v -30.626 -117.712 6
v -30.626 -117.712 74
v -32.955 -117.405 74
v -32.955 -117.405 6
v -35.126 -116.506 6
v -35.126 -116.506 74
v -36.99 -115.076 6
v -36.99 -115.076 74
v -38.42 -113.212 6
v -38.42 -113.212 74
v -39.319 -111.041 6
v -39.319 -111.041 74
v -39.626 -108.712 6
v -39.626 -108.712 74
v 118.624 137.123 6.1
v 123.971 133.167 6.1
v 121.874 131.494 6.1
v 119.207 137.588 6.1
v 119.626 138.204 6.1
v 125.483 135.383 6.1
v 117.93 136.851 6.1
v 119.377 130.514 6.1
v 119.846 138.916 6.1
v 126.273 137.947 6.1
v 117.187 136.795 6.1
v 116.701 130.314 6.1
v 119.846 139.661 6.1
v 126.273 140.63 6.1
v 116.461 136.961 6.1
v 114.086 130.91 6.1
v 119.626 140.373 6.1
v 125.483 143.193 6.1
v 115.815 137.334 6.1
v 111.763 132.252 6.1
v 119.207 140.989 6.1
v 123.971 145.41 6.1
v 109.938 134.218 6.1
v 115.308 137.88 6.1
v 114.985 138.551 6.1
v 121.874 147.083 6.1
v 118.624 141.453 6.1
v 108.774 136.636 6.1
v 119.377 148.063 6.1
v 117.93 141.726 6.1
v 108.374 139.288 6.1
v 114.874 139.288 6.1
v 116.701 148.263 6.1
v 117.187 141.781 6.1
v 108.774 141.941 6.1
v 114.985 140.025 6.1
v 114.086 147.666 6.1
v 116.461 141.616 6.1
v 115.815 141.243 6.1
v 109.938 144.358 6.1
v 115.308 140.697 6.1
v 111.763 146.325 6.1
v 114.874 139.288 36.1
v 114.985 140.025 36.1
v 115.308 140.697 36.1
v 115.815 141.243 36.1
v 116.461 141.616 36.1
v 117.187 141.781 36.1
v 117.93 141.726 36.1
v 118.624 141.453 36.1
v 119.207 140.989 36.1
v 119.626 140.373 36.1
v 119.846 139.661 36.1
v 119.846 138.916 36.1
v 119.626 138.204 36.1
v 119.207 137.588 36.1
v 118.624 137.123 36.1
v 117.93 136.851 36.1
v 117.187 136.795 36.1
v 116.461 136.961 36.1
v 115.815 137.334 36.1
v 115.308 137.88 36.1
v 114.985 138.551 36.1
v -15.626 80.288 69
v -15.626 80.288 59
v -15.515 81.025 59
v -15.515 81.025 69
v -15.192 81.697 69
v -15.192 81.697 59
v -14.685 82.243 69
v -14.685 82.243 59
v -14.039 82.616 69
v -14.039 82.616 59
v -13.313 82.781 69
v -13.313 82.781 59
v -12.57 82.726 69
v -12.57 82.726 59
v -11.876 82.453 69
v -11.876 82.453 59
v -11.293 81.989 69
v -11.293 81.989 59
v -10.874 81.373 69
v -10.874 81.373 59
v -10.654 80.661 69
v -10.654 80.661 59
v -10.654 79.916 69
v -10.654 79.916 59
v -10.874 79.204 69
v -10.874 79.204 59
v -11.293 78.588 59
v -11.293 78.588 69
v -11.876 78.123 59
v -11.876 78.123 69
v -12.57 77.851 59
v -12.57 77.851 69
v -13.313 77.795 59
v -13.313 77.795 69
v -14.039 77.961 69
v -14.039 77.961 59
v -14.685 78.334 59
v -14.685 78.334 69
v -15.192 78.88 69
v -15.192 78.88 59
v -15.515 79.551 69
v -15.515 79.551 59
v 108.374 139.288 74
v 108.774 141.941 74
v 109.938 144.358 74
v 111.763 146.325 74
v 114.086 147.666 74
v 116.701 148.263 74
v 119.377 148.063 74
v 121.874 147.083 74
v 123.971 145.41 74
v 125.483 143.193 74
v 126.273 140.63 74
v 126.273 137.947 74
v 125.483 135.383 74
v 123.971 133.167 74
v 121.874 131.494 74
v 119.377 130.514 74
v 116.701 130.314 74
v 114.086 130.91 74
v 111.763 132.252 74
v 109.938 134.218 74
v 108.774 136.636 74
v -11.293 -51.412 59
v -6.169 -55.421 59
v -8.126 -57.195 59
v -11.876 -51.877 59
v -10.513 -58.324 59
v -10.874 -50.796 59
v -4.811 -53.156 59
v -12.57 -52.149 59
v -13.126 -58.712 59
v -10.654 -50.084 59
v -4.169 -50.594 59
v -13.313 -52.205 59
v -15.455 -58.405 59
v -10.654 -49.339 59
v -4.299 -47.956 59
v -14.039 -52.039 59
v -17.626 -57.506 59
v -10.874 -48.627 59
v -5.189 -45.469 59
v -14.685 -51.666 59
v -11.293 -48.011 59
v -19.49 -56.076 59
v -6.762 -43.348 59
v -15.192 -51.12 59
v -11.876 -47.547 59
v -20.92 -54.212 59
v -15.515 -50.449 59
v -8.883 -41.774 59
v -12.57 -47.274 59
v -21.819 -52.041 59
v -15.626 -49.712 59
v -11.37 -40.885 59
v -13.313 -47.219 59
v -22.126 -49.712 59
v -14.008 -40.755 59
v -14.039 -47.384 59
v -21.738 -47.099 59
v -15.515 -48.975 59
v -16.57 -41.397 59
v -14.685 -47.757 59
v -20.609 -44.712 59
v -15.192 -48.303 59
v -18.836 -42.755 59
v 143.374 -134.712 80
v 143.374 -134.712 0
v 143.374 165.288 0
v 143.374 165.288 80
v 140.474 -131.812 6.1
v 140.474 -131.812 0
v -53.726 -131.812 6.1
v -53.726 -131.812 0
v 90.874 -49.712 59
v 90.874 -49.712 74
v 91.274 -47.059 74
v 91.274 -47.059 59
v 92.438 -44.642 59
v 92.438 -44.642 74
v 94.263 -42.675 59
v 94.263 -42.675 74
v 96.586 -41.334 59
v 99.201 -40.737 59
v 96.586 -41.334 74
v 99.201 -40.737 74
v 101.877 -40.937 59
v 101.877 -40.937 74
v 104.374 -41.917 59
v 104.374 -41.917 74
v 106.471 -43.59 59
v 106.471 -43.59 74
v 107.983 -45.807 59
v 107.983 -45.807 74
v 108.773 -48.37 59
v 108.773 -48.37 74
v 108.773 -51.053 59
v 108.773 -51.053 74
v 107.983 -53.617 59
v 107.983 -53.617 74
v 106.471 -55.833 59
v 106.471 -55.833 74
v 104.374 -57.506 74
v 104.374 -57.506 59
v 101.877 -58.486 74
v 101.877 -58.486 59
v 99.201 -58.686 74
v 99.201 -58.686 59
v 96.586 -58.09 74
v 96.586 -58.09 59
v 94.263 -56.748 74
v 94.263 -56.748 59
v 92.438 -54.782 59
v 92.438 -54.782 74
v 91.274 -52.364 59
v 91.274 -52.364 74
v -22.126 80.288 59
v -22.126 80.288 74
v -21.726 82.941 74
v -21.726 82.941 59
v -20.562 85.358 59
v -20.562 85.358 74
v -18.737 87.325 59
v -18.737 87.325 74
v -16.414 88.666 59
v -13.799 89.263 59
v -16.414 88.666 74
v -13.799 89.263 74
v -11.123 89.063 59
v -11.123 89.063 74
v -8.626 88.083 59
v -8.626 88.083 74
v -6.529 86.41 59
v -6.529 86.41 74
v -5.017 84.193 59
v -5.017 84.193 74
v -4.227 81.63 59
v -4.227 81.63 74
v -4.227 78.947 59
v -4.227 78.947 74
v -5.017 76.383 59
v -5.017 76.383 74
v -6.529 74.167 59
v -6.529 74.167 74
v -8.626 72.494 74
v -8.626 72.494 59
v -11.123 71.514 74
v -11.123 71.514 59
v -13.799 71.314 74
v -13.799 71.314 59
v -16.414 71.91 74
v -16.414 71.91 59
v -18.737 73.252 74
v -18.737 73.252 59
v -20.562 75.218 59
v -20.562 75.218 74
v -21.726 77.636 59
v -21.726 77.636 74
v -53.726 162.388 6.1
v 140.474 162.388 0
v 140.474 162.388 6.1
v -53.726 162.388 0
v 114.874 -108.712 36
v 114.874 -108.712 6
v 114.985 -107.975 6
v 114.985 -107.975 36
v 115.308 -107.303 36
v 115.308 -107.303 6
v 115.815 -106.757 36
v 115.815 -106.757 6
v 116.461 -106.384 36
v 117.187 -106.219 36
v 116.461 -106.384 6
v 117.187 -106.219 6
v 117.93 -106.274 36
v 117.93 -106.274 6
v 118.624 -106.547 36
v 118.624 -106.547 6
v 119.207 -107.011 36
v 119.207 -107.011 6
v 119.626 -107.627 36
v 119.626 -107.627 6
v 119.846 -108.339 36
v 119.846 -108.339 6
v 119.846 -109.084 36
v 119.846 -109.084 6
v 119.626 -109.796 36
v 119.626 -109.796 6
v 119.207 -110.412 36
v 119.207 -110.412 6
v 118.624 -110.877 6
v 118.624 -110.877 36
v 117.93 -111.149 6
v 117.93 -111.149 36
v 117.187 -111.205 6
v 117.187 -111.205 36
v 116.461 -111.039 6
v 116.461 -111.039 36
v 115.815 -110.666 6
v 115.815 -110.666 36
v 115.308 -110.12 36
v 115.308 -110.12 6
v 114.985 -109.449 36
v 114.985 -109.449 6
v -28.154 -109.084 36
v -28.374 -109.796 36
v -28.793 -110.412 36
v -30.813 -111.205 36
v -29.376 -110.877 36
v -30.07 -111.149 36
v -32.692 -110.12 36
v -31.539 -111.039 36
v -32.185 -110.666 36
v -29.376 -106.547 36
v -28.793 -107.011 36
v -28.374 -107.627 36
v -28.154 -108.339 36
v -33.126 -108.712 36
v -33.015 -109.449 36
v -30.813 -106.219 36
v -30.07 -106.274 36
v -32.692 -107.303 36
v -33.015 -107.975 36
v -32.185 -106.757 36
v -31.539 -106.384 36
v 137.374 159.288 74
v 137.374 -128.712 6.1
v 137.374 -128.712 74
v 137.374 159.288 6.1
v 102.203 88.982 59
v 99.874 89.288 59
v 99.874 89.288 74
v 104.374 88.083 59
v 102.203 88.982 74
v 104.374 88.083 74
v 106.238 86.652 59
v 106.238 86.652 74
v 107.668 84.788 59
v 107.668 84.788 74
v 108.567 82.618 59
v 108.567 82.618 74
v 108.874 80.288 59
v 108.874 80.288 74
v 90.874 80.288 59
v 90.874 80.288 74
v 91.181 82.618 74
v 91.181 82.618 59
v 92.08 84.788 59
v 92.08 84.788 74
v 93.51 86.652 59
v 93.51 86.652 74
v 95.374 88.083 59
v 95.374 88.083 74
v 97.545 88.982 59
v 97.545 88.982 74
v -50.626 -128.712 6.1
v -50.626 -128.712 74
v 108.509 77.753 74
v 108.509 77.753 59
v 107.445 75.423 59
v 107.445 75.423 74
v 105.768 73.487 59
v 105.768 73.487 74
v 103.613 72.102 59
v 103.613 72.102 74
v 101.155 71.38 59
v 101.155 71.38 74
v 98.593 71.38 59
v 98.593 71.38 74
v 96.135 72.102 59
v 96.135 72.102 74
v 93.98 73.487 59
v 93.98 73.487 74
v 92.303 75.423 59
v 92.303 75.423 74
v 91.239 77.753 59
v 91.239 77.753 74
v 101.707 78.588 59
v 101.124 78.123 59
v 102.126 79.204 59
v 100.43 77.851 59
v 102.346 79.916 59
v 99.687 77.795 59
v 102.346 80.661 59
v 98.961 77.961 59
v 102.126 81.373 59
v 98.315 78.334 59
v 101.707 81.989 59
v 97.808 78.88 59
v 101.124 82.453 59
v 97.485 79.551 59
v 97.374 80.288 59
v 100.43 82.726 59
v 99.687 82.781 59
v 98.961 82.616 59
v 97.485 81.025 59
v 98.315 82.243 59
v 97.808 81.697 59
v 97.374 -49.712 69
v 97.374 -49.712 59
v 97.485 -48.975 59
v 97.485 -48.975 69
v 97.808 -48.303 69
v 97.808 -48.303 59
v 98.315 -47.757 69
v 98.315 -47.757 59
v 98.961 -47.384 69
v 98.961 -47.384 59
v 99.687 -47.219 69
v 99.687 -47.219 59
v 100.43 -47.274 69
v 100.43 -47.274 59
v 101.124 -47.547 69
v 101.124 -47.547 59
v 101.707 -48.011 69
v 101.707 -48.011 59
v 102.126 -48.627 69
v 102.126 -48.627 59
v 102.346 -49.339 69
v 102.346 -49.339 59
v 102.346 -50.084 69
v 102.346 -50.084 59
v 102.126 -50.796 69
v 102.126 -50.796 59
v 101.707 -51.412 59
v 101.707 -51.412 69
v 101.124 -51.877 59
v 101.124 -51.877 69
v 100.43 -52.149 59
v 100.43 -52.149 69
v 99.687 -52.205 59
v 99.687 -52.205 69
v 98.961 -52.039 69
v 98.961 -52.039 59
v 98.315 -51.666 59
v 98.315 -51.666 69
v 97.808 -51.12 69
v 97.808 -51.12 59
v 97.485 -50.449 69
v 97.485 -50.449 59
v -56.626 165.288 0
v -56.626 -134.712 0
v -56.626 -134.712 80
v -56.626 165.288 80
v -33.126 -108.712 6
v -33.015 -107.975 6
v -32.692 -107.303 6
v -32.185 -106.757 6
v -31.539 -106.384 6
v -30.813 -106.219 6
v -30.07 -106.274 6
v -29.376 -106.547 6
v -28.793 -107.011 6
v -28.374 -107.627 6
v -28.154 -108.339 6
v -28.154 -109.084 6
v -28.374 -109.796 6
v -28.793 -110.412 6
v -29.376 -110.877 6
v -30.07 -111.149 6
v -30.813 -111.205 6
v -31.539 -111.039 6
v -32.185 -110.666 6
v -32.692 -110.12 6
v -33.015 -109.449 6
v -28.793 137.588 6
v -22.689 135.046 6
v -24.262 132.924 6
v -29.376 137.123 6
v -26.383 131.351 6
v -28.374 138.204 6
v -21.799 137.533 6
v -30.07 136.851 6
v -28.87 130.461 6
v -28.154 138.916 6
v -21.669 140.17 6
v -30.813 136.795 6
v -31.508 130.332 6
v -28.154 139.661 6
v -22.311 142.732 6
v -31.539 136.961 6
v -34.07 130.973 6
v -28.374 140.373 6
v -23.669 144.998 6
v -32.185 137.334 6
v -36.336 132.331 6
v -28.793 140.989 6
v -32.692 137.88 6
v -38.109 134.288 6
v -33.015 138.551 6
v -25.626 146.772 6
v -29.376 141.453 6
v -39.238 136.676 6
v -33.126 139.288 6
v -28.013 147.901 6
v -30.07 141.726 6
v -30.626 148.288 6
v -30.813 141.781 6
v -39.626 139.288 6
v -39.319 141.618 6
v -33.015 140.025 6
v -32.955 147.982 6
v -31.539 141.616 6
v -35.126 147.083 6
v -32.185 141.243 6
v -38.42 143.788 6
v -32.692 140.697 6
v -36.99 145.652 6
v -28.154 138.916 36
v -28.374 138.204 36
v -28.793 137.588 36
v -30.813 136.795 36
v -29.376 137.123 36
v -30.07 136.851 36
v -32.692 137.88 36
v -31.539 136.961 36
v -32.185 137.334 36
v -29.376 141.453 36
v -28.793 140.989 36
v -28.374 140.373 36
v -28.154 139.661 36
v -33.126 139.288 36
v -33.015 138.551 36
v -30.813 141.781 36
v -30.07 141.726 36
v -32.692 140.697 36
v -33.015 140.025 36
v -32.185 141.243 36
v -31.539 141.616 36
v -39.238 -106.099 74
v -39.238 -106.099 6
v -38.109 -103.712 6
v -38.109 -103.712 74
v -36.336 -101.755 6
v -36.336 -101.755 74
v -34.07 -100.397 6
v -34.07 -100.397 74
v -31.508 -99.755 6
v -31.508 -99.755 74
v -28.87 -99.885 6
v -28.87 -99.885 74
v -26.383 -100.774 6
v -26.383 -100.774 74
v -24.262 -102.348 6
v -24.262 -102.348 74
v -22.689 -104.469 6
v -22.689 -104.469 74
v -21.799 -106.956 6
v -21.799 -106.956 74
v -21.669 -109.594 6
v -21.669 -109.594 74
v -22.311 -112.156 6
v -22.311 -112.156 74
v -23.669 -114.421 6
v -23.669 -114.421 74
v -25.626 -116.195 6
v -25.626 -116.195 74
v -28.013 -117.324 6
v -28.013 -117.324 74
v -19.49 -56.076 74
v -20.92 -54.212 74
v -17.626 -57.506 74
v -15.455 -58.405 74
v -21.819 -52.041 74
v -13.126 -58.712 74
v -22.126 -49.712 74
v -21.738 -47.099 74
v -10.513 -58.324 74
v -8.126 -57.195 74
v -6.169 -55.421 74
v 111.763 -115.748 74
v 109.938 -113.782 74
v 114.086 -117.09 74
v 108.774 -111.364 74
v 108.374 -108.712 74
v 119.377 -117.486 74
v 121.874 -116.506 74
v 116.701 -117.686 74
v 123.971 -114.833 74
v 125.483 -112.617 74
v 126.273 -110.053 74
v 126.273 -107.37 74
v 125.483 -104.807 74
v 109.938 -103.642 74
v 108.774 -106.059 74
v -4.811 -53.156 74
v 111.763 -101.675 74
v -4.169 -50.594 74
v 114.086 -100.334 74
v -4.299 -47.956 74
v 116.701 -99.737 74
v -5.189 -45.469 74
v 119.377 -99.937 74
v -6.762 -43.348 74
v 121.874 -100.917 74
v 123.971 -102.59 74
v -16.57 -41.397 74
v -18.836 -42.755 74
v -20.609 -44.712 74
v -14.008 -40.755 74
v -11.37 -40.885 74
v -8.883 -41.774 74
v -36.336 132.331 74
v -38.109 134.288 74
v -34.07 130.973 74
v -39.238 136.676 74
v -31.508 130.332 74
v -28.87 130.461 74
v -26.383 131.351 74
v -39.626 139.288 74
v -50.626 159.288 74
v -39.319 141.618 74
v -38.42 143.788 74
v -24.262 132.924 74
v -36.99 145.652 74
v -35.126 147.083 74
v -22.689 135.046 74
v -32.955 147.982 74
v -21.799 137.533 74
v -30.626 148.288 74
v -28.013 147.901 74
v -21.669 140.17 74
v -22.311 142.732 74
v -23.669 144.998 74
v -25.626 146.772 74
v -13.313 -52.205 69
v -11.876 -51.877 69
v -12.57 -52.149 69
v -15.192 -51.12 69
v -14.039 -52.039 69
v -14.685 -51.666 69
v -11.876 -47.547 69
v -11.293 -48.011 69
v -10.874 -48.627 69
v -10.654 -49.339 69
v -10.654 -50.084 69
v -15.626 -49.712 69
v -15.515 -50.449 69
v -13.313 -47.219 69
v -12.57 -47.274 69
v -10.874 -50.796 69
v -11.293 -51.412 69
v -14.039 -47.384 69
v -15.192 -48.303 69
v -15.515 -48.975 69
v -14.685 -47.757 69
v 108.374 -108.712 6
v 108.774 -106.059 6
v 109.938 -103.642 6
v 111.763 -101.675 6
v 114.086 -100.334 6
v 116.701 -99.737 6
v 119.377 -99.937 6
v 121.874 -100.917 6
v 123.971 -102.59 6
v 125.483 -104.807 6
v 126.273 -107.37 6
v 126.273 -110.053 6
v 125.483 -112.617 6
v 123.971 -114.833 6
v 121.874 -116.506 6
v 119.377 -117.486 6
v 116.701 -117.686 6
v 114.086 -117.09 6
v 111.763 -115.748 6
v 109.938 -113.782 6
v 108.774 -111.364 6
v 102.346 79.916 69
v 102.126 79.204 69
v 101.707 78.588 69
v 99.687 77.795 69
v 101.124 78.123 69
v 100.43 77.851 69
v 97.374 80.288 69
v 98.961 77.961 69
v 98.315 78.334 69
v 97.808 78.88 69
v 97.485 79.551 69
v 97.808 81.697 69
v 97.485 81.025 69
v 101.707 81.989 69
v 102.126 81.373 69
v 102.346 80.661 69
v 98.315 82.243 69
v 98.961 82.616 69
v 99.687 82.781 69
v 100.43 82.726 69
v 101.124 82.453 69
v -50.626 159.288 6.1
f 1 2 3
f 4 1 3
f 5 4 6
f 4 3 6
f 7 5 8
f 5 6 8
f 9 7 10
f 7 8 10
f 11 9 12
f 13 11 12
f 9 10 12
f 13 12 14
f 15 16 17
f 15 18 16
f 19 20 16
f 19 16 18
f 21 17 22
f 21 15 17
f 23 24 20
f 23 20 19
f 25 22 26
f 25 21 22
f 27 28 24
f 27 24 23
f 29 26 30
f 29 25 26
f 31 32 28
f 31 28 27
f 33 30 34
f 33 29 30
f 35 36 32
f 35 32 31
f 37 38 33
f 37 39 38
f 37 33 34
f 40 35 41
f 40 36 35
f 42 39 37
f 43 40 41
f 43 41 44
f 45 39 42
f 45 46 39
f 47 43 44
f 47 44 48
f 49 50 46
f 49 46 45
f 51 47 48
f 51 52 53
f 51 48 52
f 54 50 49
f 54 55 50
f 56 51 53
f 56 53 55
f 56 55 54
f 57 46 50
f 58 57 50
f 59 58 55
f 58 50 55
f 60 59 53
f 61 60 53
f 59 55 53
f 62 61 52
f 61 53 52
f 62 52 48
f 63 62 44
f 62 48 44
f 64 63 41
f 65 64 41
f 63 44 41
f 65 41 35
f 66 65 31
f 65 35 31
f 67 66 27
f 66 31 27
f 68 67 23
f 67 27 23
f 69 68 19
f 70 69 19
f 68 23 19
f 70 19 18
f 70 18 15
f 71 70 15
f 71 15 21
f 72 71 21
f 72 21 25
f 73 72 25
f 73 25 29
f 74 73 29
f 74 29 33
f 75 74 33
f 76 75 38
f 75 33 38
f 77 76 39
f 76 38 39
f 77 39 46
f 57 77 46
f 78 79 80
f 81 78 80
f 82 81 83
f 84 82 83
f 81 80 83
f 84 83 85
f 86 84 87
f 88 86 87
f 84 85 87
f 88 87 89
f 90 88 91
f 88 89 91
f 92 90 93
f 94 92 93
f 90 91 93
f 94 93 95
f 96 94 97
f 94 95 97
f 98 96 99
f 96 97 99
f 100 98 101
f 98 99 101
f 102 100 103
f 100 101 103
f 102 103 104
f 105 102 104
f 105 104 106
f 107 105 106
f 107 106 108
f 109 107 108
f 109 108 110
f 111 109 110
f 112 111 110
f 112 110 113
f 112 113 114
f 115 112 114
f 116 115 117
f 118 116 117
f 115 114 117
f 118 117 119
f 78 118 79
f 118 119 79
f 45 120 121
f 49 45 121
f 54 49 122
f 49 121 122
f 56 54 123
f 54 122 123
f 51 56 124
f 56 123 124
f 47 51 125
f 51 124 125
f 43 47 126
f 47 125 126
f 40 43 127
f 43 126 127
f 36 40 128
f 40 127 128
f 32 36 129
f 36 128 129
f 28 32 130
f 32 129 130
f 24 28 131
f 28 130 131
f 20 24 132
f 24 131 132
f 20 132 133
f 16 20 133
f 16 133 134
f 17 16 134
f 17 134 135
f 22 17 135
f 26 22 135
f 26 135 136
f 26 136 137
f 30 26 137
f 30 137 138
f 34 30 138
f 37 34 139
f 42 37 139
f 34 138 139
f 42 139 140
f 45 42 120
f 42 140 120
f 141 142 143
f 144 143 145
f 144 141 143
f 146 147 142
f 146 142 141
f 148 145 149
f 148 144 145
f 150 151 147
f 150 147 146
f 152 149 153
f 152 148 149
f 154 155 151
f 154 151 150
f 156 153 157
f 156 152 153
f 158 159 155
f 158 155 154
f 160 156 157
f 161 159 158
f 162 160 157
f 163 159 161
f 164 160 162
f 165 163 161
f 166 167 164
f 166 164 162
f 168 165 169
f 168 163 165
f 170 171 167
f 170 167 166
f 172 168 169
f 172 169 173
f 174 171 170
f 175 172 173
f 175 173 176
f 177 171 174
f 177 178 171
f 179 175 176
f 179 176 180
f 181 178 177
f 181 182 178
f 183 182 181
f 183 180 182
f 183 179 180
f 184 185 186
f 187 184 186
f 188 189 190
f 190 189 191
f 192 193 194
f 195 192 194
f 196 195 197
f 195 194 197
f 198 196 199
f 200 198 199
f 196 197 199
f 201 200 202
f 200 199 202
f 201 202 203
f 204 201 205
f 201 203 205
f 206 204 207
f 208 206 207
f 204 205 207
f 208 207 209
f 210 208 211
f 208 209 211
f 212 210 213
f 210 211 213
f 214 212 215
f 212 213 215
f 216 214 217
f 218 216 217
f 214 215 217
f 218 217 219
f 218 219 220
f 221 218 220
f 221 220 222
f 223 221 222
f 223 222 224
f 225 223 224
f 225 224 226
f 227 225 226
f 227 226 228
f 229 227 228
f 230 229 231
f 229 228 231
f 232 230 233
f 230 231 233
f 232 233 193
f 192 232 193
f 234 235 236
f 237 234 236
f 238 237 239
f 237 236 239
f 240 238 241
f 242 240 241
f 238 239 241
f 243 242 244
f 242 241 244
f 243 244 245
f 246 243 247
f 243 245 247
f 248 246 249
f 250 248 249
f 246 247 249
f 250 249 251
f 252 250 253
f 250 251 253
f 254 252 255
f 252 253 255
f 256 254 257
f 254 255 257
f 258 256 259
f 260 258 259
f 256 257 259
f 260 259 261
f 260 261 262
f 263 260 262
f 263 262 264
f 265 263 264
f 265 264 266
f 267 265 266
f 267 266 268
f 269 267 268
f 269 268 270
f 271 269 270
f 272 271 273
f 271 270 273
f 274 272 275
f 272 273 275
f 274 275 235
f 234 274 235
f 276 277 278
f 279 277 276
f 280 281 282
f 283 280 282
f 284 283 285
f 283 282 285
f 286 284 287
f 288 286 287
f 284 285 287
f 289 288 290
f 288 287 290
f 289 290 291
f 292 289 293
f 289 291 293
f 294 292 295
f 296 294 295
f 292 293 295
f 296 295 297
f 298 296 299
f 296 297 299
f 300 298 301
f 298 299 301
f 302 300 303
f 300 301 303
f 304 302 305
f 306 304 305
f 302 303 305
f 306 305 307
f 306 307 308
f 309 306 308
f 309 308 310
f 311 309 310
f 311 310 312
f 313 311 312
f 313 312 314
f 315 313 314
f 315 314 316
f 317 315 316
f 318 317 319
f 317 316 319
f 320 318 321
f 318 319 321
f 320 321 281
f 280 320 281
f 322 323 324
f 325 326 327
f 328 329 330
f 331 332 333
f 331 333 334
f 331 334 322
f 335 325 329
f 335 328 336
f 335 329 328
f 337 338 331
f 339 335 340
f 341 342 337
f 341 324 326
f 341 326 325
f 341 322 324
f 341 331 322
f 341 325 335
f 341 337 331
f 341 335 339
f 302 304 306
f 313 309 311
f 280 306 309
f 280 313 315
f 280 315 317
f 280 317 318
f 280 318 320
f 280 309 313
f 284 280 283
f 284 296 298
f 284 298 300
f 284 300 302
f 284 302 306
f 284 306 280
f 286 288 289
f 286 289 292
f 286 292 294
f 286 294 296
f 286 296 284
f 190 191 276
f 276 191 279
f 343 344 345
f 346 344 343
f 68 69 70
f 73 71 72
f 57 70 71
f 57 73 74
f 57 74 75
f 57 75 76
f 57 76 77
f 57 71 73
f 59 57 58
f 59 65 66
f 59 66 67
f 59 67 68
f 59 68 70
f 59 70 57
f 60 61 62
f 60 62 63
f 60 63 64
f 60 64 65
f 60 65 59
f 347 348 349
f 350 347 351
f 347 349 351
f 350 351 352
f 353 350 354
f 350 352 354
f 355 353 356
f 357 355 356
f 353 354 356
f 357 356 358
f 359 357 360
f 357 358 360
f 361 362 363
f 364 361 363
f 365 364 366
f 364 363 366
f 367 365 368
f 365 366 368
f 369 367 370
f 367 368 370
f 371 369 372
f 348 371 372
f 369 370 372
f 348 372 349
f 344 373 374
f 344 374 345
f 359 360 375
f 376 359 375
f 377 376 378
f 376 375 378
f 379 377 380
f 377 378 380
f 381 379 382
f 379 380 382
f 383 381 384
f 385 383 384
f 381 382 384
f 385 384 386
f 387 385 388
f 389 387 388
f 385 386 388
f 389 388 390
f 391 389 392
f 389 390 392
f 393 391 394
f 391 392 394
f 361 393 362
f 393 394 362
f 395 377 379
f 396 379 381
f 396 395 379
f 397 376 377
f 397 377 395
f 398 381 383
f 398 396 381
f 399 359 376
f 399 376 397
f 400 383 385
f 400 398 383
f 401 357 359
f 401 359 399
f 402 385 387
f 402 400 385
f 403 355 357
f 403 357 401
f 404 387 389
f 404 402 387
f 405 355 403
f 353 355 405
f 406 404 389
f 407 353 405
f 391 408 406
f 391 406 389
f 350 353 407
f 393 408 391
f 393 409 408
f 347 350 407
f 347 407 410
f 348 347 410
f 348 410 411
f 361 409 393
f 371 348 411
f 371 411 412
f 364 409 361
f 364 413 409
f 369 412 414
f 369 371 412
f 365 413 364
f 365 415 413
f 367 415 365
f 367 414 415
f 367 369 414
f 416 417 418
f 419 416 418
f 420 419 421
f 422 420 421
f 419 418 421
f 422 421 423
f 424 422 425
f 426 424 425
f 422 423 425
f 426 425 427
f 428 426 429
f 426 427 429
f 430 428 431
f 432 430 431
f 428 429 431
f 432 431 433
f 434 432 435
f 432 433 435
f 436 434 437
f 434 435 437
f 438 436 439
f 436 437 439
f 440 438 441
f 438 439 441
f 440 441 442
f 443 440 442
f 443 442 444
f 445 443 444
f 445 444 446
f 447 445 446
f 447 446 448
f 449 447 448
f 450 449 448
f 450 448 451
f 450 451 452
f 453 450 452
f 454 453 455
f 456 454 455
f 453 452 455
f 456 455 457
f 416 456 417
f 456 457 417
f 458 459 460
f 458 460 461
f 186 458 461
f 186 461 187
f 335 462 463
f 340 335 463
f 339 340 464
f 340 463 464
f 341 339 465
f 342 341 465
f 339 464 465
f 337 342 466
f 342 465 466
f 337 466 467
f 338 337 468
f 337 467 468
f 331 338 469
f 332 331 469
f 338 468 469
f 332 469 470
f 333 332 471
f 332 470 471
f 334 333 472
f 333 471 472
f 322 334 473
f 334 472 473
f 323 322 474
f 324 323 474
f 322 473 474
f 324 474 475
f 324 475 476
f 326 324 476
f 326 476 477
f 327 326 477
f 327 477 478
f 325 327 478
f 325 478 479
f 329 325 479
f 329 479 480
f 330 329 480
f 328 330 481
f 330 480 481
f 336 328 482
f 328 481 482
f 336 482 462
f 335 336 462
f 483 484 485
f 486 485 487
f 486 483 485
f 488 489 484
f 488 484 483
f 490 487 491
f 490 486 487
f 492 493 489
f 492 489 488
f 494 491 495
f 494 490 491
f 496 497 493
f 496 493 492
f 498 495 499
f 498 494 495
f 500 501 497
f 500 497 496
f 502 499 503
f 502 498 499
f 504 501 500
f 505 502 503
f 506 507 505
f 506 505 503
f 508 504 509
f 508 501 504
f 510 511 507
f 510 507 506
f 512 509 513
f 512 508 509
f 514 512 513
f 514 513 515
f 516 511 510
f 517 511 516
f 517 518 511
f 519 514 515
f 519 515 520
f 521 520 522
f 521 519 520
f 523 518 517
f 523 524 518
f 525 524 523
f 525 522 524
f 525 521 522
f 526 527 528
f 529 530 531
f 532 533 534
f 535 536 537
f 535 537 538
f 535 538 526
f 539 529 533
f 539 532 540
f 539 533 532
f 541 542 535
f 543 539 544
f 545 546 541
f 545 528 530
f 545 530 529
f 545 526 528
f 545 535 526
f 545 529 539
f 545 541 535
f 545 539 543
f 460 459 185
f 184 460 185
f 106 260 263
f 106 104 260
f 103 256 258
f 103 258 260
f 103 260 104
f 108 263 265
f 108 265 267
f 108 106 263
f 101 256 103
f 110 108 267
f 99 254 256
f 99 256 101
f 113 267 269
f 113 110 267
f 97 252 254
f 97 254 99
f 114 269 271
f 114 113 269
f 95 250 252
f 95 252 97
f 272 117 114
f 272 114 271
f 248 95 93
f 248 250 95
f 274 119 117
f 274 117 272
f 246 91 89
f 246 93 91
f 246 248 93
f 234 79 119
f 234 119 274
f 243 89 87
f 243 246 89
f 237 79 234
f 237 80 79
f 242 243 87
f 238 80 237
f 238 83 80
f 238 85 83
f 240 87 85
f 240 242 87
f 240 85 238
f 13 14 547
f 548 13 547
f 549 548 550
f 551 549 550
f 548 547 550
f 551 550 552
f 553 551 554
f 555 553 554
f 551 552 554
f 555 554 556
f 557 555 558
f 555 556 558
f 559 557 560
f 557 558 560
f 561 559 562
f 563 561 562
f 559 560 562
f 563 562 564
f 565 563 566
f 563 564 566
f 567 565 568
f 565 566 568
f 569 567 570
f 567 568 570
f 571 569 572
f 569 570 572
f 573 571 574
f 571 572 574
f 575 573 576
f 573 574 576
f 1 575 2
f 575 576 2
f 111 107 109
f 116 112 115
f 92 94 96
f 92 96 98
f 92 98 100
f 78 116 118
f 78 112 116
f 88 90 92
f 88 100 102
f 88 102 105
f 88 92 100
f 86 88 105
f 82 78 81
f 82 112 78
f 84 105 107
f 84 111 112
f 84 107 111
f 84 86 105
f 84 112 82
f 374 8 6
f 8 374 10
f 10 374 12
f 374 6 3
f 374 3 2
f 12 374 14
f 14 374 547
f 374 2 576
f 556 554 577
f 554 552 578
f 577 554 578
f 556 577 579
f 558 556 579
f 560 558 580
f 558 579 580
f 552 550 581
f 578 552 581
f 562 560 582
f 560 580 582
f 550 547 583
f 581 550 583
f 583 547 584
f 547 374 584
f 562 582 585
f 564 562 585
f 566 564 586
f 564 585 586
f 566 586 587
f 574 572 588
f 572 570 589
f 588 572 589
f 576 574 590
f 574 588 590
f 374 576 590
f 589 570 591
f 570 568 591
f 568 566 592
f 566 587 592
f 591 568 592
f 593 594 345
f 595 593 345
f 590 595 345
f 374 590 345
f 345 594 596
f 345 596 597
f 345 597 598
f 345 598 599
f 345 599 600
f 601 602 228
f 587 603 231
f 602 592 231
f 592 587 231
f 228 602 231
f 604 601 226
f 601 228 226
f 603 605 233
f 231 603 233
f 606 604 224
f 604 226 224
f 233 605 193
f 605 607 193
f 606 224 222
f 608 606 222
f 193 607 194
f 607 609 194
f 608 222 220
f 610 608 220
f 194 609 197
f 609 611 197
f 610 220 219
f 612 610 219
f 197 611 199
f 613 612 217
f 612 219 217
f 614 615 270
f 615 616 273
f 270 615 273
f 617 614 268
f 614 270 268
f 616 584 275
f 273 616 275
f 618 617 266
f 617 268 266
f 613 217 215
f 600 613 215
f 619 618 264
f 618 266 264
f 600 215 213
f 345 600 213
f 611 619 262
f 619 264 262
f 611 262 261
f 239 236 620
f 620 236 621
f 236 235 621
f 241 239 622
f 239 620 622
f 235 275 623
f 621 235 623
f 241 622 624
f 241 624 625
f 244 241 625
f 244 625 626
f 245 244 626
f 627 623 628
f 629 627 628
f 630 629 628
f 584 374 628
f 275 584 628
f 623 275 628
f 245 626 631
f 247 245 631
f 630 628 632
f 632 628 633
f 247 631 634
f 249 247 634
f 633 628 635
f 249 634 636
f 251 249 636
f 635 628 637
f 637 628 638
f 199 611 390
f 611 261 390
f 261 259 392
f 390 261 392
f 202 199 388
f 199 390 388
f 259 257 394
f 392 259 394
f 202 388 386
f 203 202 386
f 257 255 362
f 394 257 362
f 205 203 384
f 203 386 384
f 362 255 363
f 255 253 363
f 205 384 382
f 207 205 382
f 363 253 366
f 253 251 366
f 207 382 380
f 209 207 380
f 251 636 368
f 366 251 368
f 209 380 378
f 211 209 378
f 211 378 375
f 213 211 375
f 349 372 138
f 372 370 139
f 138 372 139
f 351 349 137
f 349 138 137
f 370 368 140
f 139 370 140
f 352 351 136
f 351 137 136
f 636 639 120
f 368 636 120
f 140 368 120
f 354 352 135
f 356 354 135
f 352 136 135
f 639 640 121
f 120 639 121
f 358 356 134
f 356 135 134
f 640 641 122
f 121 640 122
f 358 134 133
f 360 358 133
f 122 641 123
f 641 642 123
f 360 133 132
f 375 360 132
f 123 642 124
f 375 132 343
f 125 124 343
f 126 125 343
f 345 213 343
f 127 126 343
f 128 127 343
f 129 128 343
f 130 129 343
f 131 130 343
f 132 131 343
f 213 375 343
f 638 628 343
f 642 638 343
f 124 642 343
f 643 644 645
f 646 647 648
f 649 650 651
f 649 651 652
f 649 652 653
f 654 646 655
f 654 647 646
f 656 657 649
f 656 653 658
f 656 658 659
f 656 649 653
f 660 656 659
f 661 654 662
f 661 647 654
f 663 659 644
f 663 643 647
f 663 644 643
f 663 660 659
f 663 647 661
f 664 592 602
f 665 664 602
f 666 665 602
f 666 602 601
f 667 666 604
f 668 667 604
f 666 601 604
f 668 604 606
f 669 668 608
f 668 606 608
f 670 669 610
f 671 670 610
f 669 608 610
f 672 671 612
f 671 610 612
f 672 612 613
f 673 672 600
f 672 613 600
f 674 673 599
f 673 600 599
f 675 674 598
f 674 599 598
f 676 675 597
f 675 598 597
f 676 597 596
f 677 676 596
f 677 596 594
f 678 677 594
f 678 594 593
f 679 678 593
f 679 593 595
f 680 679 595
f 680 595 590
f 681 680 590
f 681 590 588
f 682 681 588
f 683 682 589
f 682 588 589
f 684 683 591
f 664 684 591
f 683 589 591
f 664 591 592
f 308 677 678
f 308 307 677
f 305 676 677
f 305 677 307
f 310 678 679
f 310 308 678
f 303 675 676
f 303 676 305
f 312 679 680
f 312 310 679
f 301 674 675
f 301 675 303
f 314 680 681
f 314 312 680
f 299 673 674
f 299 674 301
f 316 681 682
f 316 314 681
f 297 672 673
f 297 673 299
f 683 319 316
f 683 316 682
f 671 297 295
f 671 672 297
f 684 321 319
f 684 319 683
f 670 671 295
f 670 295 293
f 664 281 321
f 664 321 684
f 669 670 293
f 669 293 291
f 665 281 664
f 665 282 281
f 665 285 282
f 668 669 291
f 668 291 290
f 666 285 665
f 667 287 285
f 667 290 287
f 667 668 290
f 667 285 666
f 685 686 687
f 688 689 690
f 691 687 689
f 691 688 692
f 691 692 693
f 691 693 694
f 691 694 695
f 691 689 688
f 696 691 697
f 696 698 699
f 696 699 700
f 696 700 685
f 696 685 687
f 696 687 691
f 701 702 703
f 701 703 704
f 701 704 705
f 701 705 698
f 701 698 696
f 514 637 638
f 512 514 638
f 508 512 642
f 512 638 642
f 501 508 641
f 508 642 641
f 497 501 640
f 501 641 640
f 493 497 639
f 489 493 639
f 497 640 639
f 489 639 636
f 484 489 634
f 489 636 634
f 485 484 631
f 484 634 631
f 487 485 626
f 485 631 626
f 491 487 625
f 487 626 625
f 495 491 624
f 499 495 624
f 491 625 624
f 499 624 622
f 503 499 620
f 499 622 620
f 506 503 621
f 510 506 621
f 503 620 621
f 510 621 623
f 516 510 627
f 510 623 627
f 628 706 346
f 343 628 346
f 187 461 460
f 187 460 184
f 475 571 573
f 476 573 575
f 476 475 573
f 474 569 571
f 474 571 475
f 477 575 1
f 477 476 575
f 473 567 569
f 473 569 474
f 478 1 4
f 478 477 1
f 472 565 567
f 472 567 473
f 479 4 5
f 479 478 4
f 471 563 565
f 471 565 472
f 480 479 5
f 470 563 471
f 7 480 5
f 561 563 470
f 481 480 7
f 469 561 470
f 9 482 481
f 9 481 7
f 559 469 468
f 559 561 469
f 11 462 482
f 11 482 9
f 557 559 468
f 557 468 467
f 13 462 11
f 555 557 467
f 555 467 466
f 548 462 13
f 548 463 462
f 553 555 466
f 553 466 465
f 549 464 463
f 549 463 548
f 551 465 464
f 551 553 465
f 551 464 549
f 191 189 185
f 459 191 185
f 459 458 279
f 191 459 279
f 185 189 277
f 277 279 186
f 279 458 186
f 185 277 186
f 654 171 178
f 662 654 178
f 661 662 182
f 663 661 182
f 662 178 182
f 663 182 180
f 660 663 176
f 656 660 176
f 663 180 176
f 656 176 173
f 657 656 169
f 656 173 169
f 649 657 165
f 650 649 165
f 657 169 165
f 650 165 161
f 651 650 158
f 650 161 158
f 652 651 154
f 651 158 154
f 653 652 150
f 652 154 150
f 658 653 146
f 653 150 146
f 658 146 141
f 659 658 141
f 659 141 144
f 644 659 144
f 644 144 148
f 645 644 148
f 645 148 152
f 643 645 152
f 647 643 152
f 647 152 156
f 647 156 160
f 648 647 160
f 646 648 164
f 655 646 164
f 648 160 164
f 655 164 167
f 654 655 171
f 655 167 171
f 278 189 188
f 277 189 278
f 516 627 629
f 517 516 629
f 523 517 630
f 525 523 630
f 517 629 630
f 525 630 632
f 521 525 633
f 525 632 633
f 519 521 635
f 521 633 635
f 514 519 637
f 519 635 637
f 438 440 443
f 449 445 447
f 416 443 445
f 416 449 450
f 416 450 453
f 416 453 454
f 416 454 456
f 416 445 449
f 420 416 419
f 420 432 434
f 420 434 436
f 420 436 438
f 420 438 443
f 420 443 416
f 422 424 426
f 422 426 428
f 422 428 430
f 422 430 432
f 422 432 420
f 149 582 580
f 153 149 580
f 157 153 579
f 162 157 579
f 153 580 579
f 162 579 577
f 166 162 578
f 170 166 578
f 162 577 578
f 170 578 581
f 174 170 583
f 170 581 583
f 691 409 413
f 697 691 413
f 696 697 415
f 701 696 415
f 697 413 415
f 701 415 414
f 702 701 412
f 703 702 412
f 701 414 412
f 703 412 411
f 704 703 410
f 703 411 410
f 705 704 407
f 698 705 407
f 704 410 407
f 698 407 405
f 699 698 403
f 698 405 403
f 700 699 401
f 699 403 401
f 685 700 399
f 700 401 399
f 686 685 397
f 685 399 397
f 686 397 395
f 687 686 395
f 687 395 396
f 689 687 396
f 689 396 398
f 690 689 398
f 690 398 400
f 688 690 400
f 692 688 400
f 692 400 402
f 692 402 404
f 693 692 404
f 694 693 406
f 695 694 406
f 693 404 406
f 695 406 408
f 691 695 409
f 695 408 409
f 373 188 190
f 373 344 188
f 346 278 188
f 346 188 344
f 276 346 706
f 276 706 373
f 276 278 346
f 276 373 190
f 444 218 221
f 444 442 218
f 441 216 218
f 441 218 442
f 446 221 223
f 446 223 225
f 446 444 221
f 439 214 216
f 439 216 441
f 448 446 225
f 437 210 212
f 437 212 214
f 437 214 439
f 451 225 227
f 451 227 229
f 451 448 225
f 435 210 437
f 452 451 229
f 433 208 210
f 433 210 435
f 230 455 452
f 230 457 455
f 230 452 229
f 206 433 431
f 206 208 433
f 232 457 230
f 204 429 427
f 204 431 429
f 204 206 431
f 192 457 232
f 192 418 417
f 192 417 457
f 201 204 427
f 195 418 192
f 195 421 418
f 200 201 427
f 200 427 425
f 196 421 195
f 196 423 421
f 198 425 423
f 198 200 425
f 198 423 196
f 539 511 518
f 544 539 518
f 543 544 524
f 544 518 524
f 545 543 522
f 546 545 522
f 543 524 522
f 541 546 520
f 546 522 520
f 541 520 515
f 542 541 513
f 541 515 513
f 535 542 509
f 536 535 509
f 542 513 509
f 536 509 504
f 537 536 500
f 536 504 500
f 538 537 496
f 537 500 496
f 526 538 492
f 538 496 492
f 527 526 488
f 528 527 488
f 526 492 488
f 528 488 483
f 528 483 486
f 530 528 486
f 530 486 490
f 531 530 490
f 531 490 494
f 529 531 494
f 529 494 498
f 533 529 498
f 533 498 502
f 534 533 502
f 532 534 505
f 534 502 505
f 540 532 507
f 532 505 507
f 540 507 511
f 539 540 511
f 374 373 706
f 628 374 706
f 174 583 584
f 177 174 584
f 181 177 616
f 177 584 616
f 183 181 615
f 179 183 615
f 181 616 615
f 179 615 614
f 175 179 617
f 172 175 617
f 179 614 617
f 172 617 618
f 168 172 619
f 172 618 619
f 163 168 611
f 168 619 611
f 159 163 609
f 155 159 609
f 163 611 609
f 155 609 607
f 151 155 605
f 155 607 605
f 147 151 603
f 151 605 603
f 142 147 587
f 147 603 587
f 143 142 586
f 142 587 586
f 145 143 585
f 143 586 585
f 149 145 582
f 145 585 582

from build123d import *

# Parameters (mm, degrees)
ESQUISSE1_W             = 200
ESQUISSE1_H             = 300
BOSS_EXTRU_1_DEPTH      = 80
COQUE1_T                = -6
ESQUISSE3_W             = 194.2
ESQUISSE3_H             = 294.2
ENL_V_MAT_EXTRU_2_DEPTH = 6.1
ESQUISSE4_R             = 9
BOSS_EXTRU_2_DEPTH      = 67.9
ESQUISSE5_R             = 2.5
ENL_V_MAT_EXTRU_3_DEPTH = 30
ESQUISSE4_4_R           = 9
BOSS_EXTRU_3_DEPTH      = 15
ESQUISSE6_R             = 2.5
ENL_V_MAT_EXTRU_6_DEPTH = 10
ESQUISSE8_R             = 9
BOSS_EXTRU_5_DEPTH      = 68
ESQUISSE9_R             = 2.5
ENL_V_MAT_EXTRU_8_DEPTH = 30


with BuildPart() as part:
    # Esquisse1 → Boss.-Extru.1 (new body)
    with BuildSketch(Plane.XY):
        with Locations((43.373964051, -118.711656442)):
            Rectangle(ESQUISSE1_W, ESQUISSE1_H)
    extrude(amount=BOSS_EXTRU_1_DEPTH)

    # Coque1
    coque1_openings = [part.faces().sort_by_distance(p)[0] for p in [
        (43.373964051, -118.711656442, 0),
    ]]
    offset(amount=COQUE1_T, openings=coque1_openings, kind=Kind.INTERSECTION)

    # Esquisse3 → Enlèv. mat.-Extru.2 (cut)
    with BuildSketch(Plane(origin=(0, 0, 0), x_dir=(-1, 0, 0), z_dir=(0, 0, -1))):
        with Locations((-43.373964051, -118.711656442)):
            Rectangle(ESQUISSE3_W, ESQUISSE3_H)
    extrude(amount=-ENL_V_MAT_EXTRU_2_DEPTH, mode=Mode.SUBTRACT)

    # Esquisse4 → Boss.-Extru.2 (add)
    with BuildSketch(Plane(origin=(0, 0, 74), x_dir=(-1, 0, 0), z_dir=(0, 0, -1))):
        with Locations((-117.373964051, 5.288343558)):
            Circle(ESQUISSE4_R)
    extrude(amount=BOSS_EXTRU_2_DEPTH)

    # Esquisse5 → Enlèv. mat.-Extru.3 (cut)
    with BuildSketch(Plane(origin=(0, 0, 6.1), x_dir=(-1, 0, 0), z_dir=(0, 0, -1))):
        with Locations((-117.373964051, 5.288343558)):
            Circle(ESQUISSE5_R)
    extrude(amount=-ENL_V_MAT_EXTRU_3_DEPTH, mode=Mode.SUBTRACT)

    # Esquisse4<4> → Boss.-Extru.3 (add)
    with BuildSketch(Plane(origin=(0, 0, 74), x_dir=(-1, 0, 0), z_dir=(0, 0, -1))):
        with Locations((13.126035949, -183.711656442)):
            Circle(ESQUISSE4_4_R)
        with Locations((-99.873964051, -183.711656442)):
            Circle(ESQUISSE4_4_R)
        with Locations((-99.873964051, -53.711656442)):
            Circle(ESQUISSE4_4_R)
        with Locations((13.126035949, -53.711656442)):
            Circle(ESQUISSE4_4_R)
    extrude(amount=BOSS_EXTRU_3_DEPTH)

    # Esquisse6 → Enlèv. mat.-Extru.6 (cut)
    with BuildSketch(Plane(origin=(0, 0, 59), x_dir=(-1, 0, 0), z_dir=(0, 0, -1))):
        with Locations((-99.873964051, -53.711656442)):
            Circle(ESQUISSE6_R)
        with Locations((13.126035949, -53.711656442)):
            Circle(ESQUISSE6_R)
        with Locations((-99.873964051, -183.711656442)):
            Circle(ESQUISSE6_R)
        with Locations((13.126035949, -183.711656442)):
            Circle(ESQUISSE6_R)
    extrude(amount=-ENL_V_MAT_EXTRU_6_DEPTH, mode=Mode.SUBTRACT)

    # Esquisse8 → Boss.-Extru.5 (add)
    with BuildSketch(Plane(origin=(0, 0, 74), x_dir=(-1, 0, 0), z_dir=(0, 0, -1))):
        with Locations((30.626035949, 5.288343558)):
            Circle(ESQUISSE8_R)
        with Locations((30.626035949, -242.711656442)):
            Circle(ESQUISSE8_R)
        with Locations((-117.373964051, -242.711656442)):
            Circle(ESQUISSE8_R)
    extrude(amount=BOSS_EXTRU_5_DEPTH)

    # Esquisse9 → Enlèv. mat.-Extru.8 (cut)
    with BuildSketch(Plane(origin=(0, 0, 6), x_dir=(-1, 0, 0), z_dir=(0, 0, -1))):
        with Locations((30.626035949, 5.288343558)):
            Circle(ESQUISSE9_R)
        with Locations((30.626035949, -242.711656442)):
            Circle(ESQUISSE9_R)
        with Locations((-117.373964051, -242.711656442)):
            Circle(ESQUISSE9_R)
    extrude(amount=-ENL_V_MAT_EXTRU_8_DEPTH, mode=Mode.SUBTRACT)


with BuildPart() as part_1:
    # Corps-Déplacer/Copier1: moved
    add(part.part.moved(Location((0, 114, 0))))


with BuildPart() as part_2:
    # Corps-Déplacer/Copier2: moved
    add(part_1.part.moved(Location((0, 20, 0))))


solid = part_2.part
